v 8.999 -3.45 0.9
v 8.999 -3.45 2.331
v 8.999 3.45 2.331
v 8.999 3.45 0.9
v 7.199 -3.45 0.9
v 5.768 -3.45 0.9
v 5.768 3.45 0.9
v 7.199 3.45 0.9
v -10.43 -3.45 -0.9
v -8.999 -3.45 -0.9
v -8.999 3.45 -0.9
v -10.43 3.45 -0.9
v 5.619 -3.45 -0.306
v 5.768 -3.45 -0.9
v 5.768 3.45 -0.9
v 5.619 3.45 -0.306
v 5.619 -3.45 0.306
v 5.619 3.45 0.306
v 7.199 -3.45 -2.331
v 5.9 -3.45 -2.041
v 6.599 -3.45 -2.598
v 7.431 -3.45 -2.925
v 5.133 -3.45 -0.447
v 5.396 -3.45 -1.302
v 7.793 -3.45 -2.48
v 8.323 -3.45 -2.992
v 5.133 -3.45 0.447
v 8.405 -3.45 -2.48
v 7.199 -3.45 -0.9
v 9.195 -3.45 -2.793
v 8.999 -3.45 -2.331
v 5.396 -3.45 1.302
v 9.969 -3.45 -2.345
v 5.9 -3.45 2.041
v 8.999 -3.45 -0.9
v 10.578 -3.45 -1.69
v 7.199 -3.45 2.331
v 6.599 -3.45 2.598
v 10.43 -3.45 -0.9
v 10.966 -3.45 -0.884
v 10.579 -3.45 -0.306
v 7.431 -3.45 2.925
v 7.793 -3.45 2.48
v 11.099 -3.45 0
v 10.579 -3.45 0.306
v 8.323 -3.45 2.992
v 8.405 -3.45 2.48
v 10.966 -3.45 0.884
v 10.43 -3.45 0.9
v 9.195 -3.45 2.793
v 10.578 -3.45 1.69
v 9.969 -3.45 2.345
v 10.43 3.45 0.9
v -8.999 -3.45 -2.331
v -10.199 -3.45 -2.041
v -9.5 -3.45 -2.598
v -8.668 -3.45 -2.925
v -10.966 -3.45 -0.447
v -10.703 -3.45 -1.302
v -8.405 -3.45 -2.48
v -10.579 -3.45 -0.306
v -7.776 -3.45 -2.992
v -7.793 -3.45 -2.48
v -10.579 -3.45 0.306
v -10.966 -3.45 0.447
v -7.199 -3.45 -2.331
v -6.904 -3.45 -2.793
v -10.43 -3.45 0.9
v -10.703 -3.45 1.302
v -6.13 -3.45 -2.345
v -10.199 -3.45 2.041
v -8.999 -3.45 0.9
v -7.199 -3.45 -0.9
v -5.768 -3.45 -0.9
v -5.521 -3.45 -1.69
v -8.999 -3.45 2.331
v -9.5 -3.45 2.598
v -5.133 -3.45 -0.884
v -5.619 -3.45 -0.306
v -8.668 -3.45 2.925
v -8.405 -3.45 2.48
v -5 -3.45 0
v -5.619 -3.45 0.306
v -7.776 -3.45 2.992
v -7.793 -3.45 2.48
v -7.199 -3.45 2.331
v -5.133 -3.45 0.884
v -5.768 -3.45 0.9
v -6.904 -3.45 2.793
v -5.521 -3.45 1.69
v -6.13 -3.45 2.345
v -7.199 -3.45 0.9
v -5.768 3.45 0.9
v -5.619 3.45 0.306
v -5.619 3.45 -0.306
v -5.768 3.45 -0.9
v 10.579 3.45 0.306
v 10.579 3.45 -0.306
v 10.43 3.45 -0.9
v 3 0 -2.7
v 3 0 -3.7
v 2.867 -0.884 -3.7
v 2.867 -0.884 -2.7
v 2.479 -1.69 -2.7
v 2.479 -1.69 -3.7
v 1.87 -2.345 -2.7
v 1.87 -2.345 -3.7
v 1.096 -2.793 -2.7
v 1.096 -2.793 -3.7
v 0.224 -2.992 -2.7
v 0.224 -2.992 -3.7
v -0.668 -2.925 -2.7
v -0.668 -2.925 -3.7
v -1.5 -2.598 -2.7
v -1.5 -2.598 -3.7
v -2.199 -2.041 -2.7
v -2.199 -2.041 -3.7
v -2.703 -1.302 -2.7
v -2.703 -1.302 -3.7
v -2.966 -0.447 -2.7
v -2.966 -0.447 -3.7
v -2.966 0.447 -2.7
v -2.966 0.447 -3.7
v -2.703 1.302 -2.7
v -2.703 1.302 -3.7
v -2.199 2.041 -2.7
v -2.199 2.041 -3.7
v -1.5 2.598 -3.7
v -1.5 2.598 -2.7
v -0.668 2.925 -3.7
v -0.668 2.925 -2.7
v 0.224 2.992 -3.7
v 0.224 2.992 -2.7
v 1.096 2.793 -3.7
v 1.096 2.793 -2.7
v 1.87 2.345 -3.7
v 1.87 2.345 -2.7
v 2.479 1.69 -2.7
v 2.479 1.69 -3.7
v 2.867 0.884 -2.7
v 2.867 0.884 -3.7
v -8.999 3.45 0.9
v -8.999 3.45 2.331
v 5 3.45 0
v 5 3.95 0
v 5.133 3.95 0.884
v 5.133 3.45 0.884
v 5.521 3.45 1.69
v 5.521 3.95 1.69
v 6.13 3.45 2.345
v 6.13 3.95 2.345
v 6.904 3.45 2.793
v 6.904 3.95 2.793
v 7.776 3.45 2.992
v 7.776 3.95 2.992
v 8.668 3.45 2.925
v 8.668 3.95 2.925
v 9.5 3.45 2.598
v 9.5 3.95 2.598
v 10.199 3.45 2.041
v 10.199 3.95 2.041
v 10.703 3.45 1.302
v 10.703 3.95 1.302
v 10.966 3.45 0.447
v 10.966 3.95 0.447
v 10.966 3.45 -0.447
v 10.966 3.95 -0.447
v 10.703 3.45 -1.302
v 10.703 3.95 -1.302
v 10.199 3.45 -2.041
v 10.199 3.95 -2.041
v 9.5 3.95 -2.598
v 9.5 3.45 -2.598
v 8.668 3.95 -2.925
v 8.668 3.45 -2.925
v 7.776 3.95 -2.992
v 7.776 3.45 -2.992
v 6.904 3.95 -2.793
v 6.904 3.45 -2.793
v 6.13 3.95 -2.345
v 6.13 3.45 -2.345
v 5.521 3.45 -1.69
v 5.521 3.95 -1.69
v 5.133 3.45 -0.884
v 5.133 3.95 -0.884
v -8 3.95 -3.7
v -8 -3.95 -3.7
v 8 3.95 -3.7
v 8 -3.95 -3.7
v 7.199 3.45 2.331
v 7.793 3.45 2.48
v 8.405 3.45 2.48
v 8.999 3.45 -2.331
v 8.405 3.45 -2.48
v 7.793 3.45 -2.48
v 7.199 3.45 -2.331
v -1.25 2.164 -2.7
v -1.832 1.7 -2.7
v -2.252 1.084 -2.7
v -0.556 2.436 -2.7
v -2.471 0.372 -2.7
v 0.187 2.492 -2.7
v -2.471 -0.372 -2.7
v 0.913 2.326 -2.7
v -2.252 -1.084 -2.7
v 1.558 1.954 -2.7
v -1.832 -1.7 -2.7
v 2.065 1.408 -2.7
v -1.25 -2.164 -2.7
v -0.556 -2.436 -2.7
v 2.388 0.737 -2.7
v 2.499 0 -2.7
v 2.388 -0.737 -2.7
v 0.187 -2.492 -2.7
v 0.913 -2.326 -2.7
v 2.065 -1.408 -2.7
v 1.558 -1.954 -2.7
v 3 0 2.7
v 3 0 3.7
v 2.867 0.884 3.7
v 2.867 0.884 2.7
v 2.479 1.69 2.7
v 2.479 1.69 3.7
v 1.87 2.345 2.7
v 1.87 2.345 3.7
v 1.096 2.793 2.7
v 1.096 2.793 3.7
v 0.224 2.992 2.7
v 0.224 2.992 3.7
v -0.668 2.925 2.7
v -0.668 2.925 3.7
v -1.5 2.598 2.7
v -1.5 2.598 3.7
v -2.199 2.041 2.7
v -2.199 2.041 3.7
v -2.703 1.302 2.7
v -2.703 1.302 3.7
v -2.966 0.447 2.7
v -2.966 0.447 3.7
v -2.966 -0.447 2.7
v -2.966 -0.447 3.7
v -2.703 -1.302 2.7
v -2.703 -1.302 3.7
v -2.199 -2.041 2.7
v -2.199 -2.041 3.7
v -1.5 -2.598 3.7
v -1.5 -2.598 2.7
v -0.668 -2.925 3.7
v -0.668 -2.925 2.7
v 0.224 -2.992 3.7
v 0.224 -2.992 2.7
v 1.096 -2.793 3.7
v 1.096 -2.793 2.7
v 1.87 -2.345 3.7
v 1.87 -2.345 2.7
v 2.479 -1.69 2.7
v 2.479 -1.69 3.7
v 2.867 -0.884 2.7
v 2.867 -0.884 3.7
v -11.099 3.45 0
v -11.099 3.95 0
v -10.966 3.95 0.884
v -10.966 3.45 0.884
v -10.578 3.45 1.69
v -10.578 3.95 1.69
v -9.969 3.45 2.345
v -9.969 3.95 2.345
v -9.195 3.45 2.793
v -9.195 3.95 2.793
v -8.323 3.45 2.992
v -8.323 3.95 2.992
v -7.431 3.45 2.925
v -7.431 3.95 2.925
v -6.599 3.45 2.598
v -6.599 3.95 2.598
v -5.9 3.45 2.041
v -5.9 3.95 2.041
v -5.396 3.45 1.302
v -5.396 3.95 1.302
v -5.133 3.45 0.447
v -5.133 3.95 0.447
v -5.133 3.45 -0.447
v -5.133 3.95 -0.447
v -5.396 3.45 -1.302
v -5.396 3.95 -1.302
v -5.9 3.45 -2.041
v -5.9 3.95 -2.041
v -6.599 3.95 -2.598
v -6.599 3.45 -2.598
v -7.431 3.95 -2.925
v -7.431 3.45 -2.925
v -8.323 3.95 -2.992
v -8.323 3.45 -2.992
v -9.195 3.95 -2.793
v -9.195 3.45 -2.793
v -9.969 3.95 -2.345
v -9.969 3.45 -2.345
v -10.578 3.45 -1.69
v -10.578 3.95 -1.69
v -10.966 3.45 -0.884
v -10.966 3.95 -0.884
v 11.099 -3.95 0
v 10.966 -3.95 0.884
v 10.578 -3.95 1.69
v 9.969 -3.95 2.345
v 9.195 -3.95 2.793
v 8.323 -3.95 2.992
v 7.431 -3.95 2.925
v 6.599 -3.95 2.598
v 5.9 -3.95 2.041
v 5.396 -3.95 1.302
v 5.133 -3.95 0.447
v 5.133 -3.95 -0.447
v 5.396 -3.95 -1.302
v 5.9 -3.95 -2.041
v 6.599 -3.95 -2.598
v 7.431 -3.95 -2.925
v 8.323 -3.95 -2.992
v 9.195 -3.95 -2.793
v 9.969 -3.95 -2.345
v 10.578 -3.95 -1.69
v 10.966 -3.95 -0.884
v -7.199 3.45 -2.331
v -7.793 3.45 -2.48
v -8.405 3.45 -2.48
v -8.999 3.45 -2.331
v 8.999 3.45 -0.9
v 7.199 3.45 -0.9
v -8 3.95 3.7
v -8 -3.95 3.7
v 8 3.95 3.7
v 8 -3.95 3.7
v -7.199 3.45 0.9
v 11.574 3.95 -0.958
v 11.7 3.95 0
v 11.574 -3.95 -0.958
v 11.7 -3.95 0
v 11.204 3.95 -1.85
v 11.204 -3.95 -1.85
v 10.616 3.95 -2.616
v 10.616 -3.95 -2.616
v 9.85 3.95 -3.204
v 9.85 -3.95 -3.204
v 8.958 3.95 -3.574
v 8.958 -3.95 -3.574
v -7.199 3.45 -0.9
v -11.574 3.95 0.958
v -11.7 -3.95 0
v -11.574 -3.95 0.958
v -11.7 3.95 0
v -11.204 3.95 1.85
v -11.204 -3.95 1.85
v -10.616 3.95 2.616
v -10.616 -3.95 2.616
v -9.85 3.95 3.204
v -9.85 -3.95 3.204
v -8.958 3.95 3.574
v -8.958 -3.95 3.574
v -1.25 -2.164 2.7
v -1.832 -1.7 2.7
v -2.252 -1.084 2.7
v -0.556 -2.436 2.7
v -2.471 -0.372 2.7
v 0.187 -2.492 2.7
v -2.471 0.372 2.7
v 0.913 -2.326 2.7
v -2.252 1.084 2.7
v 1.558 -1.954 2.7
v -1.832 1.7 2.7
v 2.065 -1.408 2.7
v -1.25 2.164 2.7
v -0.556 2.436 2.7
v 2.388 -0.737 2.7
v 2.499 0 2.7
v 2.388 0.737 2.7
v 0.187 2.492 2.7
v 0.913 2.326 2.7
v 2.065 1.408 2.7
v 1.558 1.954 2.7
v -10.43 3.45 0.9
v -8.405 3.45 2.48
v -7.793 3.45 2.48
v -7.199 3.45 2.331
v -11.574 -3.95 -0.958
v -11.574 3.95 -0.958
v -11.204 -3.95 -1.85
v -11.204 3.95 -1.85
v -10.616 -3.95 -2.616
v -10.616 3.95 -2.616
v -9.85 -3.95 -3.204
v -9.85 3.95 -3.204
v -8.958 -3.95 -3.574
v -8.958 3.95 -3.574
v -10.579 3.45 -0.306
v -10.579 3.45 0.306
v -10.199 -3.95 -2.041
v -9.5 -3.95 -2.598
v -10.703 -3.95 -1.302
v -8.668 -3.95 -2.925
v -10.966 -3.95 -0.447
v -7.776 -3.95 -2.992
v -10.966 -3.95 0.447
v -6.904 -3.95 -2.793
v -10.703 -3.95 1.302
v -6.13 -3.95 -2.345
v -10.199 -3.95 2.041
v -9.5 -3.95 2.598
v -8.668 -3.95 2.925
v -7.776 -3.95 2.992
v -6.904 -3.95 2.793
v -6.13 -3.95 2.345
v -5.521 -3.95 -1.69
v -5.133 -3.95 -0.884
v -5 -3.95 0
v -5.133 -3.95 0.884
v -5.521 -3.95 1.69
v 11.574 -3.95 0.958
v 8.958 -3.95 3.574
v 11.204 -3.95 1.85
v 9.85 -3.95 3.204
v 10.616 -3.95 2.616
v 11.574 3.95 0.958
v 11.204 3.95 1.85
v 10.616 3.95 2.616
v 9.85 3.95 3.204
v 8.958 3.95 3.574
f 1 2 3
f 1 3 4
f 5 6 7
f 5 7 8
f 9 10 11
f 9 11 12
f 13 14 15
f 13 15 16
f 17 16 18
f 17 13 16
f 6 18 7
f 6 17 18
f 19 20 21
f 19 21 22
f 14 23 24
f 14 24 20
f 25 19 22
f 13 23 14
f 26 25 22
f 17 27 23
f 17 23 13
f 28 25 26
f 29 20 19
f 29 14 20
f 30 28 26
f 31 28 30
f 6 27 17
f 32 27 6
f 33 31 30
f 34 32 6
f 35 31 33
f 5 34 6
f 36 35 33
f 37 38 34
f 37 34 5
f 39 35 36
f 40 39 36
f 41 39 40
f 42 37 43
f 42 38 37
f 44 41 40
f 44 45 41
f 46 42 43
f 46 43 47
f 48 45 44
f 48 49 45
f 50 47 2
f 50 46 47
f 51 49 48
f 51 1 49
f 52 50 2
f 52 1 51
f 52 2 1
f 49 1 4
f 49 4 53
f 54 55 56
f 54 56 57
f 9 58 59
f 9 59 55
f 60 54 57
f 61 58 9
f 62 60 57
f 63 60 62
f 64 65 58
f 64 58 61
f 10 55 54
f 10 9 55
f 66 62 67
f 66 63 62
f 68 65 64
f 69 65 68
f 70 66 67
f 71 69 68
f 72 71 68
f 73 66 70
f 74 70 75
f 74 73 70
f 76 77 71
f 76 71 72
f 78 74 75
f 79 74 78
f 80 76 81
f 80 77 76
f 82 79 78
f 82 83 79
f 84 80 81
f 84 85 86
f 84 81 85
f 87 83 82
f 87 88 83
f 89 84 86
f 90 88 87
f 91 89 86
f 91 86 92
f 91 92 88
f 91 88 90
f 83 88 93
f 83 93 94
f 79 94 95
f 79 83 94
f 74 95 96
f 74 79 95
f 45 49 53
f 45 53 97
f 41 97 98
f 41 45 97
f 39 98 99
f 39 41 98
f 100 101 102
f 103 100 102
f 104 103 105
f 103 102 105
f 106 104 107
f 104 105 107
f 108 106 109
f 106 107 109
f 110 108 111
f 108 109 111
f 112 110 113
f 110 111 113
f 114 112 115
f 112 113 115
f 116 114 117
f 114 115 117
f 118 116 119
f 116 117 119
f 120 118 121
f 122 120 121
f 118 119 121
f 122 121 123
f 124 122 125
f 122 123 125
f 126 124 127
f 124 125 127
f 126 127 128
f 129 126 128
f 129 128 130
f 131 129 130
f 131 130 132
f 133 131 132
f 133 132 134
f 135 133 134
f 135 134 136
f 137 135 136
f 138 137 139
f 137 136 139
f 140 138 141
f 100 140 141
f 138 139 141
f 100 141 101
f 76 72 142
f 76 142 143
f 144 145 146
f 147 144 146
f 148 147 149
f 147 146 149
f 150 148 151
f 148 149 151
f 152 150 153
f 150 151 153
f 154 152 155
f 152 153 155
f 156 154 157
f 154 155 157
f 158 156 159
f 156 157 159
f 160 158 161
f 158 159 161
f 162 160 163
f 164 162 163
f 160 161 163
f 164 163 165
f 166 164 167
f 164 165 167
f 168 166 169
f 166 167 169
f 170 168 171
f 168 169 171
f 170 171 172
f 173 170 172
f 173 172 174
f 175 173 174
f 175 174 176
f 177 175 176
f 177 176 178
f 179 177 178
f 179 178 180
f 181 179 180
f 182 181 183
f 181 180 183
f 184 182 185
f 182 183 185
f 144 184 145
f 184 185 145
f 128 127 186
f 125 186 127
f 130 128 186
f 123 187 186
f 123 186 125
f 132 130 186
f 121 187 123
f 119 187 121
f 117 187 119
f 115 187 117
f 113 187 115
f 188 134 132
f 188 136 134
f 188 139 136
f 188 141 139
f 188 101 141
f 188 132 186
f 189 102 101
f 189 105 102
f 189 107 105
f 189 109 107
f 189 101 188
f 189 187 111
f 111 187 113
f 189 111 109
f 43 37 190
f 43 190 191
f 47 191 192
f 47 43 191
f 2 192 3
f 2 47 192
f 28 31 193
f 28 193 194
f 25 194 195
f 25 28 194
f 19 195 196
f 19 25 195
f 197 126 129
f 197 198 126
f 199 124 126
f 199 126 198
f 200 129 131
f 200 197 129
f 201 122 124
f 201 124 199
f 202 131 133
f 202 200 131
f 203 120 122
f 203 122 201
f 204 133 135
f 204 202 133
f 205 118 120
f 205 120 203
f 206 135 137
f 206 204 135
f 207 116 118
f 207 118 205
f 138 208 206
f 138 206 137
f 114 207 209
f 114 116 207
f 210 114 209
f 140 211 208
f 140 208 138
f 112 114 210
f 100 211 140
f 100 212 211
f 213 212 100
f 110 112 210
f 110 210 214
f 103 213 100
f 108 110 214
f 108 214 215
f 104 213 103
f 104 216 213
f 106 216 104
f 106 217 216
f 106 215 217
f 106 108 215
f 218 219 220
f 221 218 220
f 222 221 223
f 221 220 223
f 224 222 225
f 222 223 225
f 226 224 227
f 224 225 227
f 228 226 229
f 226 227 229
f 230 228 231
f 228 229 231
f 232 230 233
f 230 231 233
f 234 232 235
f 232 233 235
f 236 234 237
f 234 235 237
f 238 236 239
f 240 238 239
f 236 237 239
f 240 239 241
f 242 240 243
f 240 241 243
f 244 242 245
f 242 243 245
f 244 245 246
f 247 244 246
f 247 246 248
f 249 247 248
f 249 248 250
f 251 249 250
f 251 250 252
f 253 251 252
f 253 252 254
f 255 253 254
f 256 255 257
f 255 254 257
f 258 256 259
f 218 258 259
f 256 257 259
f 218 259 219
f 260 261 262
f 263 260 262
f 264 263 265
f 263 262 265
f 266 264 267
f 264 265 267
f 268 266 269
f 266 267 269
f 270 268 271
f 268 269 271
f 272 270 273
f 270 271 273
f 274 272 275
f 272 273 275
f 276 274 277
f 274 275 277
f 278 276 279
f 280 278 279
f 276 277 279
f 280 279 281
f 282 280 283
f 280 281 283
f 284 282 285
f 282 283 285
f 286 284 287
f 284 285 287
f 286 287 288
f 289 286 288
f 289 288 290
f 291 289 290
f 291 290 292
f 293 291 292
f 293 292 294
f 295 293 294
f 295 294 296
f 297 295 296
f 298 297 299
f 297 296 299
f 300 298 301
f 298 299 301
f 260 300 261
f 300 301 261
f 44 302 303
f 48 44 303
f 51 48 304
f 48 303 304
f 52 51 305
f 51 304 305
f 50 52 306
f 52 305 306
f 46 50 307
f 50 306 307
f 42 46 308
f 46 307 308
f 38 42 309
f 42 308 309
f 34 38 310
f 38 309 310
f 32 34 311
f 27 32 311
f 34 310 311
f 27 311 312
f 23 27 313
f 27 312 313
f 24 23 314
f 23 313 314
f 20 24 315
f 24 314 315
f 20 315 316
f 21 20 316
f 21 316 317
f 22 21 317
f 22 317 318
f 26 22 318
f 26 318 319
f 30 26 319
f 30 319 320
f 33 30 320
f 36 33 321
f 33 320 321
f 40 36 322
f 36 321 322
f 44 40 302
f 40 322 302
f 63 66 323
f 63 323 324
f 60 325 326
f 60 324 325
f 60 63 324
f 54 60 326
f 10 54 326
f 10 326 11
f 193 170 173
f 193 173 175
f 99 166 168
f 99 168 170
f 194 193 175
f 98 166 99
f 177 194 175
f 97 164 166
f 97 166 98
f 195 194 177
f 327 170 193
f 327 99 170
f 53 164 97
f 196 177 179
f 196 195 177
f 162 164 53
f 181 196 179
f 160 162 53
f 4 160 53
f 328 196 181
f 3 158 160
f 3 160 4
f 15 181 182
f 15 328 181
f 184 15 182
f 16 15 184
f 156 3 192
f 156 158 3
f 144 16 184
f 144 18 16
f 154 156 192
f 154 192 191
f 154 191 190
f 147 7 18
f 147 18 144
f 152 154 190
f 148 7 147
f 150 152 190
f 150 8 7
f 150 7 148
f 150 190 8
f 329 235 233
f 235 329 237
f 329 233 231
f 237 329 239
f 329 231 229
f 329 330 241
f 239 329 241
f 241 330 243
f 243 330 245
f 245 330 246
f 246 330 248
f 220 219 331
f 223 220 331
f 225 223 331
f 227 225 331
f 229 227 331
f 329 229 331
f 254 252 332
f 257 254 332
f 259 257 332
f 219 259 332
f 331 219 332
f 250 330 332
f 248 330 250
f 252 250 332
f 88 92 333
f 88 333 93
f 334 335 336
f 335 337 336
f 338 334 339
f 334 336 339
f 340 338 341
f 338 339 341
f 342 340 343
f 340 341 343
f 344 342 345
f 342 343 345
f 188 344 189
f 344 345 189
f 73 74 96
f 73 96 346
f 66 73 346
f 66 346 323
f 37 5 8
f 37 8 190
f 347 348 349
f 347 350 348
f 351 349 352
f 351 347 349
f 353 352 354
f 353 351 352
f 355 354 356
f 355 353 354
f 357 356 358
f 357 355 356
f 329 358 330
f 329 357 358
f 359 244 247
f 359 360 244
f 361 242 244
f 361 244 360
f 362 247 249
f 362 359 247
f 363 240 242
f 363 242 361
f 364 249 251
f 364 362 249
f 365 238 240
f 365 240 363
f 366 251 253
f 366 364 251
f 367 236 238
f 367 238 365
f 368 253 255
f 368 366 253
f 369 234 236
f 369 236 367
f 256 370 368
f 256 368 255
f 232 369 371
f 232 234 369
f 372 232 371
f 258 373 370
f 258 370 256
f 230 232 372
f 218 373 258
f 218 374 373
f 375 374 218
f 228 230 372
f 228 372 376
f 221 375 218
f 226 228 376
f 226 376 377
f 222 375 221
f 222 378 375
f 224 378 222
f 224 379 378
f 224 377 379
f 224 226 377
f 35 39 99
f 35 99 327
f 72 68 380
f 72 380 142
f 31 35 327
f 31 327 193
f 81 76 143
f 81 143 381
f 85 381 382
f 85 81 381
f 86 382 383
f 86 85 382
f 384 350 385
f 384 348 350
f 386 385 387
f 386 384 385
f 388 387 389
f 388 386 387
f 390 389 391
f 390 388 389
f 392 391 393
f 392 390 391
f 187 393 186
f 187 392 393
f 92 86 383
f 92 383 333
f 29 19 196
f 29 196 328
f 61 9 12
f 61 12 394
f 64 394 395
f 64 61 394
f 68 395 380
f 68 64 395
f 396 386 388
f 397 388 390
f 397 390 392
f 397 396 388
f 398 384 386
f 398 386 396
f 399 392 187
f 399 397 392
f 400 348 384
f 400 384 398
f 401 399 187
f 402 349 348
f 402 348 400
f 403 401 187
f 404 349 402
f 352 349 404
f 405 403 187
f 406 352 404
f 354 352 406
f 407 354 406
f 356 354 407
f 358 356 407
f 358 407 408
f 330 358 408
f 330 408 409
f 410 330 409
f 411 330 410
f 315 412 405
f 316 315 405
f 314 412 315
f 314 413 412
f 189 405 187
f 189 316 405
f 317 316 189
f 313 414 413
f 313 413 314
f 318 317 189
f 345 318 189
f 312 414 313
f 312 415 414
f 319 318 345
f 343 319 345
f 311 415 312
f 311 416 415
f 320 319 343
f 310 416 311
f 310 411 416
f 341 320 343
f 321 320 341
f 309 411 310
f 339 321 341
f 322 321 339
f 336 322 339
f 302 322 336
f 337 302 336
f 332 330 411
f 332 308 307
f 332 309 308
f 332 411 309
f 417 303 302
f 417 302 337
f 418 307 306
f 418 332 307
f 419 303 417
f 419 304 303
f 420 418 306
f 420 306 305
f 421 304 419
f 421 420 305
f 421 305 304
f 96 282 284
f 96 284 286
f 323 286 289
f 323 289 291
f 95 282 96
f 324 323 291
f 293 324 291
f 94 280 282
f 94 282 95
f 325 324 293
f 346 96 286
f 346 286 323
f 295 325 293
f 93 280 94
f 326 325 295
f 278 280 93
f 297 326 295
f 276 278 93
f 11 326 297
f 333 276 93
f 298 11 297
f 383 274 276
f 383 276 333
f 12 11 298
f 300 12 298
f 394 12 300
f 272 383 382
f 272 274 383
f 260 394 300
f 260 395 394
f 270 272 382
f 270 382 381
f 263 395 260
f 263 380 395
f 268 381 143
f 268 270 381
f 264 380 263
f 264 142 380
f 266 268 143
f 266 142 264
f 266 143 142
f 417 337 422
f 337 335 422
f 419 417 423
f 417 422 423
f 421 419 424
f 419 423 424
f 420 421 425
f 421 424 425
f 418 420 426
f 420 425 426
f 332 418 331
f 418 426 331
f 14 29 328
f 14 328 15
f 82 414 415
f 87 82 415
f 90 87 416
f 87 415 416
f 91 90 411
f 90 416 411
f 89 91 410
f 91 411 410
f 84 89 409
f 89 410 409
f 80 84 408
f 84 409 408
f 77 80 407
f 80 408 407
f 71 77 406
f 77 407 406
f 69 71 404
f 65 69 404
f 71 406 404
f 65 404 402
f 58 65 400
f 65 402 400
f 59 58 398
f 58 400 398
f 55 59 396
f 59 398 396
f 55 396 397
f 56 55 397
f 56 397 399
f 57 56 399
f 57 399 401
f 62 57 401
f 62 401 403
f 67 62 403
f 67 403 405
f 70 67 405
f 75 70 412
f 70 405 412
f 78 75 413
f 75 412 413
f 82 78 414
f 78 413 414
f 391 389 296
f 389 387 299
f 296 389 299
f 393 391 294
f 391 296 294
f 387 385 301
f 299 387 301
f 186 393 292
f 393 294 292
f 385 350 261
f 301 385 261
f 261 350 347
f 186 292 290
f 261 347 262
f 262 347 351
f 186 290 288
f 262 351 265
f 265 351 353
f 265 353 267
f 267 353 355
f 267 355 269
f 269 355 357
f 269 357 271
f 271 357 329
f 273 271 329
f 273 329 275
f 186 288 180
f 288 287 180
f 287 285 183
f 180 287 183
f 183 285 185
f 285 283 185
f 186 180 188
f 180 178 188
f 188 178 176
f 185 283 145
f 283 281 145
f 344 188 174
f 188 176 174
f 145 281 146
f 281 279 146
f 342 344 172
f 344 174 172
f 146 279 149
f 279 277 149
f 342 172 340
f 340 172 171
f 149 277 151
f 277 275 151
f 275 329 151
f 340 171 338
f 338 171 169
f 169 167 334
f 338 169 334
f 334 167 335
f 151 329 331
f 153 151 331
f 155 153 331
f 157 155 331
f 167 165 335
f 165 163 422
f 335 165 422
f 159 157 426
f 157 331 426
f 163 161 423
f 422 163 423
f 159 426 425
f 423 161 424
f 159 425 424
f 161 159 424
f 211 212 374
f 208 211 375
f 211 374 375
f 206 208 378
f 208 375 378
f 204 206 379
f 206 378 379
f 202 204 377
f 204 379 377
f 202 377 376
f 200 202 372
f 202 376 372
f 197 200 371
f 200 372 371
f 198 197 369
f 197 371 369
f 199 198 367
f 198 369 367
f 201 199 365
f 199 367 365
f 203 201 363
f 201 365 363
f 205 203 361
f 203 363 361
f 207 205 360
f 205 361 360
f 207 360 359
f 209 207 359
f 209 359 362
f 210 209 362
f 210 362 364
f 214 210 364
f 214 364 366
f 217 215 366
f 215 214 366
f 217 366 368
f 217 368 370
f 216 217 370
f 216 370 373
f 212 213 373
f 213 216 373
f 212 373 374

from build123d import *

# Parameters (mm, degrees)
F0_W      = 23.4
F0_H      = 7.4
F1_DEPTH  = 3.95
F2_R      = 3.69999
F3_R      = 2.499
F4_DEPTH  = 25
F3_R_2    = 3
F5_DEPTH  = 1
F6_R      = 3
F6_R_2    = 2.499
F7_DEPTH  = 1
F8_R      = 3
F9_DEPTH  = 0.5
F10_R     = 3
F11_DEPTH = 0.5


# Not quite as in the source:
# - a fillet or chamfer is up to 0.001 mm smaller than in the source, because OpenCascade refuses the exact size


with BuildPart() as f1:
    # F0 (on Front) → F1 (new body, symmetric)
    with BuildSketch(Plane.XZ):
        Rectangle(F0_W, F0_H)
        with BuildLine():
            ThreePointArc((-7.199, -2.3313088598), (-8.099, -2.499), (-8.999, -2.3313088598))
            Line((-8.999, -2.3313088598), (-8.999, -0.9))
            Line((-8.999, -0.9), (-10.4303088598, -0.9))
            ThreePointArc((-10.4303088598, -0.9), (-10.598, 0), (-10.4303088598, 0.9))
            Line((-10.4303088598, 0.9), (-8.999, 0.9))
            Line((-8.999, 0.9), (-8.999, 2.3313088598))
            ThreePointArc((-8.999, 2.3313088598), (-8.099, 2.499), (-7.199, 2.3313088598))
            Line((-7.199, 2.3313088598), (-7.199, 0.9))
            Line((-7.199, 0.9), (-5.7676911402, 0.9))
            ThreePointArc((-5.7676911402, 0.9), (-5.6, 0), (-5.7676911402, -0.9))
            Line((-5.7676911402, -0.9), (-7.199, -0.9))
            Line((-7.199, -0.9), (-7.199, -2.3313088598))
        make_face(mode=Mode.SUBTRACT)
        with BuildLine():
            Line((7.199, 0.9), (7.199, 2.3313088598))
            ThreePointArc((7.199, 2.3313088598), (8.099, 2.499), (8.999, 2.3313088598))
            Line((8.999, 2.3313088598), (8.999, 0.9))
            Line((8.999, 0.9), (10.4303088598, 0.9))
            ThreePointArc((10.4303088598, 0.9), (10.598, 0), (10.4303088598, -0.9))
            Line((10.4303088598, -0.9), (8.999, -0.9))
            Line((8.999, -0.9), (8.999, -2.3313088598))
            ThreePointArc((8.999, -2.3313088598), (8.099, -2.499), (7.199, -2.3313088598))
            Line((7.199, -2.3313088598), (7.199, -0.9))
            Line((7.199, -0.9), (5.7676911402, -0.9))
            ThreePointArc((5.7676911402, -0.9), (5.6, 0), (5.7676911402, 0.9))
            Line((5.7676911402, 0.9), (7.199, 0.9))
        make_face(mode=Mode.SUBTRACT)
    extrude(amount=F1_DEPTH, both=True)

    # F2 (radius 3.7 in the source; OpenCascade refuses exactly that, so slightly less here)
    f2_edges = [f1.edges().sort_by_distance(p)[0] for p in [
        (-11.7, 0, -3.7),
        (-11.7, 0, 3.7),
        (11.7, 0, 3.7),
        (11.7, 0, -3.7),
    ]]
    fillet(f2_edges, radius=F2_R)

    # F3 (on face) → F4 (cut)
    with BuildSketch(Plane.XY.offset(3.7)):
        Circle(F3_R)
    extrude(amount=-F4_DEPTH, mode=Mode.SUBTRACT)

    # F3 (on face) → F5 (cut)
    with BuildSketch(Plane.XY.offset(3.7)):
        Circle(F3_R_2)
        Circle(F3_R, mode=Mode.SUBTRACT)
    extrude(amount=-F5_DEPTH, mode=Mode.SUBTRACT)

    # F6 (on face) → F7 (cut)
    with BuildSketch(Plane(origin=(0, 0, -3.7), x_dir=(1, 0, 0), z_dir=(0, 0, -1))):
        Circle(F6_R)
        Circle(F6_R_2, mode=Mode.SUBTRACT)
    extrude(amount=-F7_DEPTH, mode=Mode.SUBTRACT)

    # F8 (on face) → F9 (cut)
    with BuildSketch(Plane.XZ.offset(3.95)):
        with Locations((-8, 0)):
            Circle(F8_R)
        with Locations((8.099, 0)):
            Circle(F8_R)
    extrude(amount=-F9_DEPTH, mode=Mode.SUBTRACT)

    # F10 (on face) → F11 (cut)
    with BuildSketch(Plane(origin=(0, 3.95, 0), x_dir=(-1, 0, 0), z_dir=(0, 1, 0))):
        with Locations((-8, 0)):
            Circle(F10_R)
        with Locations((8.099, 0)):
            Circle(F10_R)
    extrude(amount=-F11_DEPTH, mode=Mode.SUBTRACT)


solid = f1.part
